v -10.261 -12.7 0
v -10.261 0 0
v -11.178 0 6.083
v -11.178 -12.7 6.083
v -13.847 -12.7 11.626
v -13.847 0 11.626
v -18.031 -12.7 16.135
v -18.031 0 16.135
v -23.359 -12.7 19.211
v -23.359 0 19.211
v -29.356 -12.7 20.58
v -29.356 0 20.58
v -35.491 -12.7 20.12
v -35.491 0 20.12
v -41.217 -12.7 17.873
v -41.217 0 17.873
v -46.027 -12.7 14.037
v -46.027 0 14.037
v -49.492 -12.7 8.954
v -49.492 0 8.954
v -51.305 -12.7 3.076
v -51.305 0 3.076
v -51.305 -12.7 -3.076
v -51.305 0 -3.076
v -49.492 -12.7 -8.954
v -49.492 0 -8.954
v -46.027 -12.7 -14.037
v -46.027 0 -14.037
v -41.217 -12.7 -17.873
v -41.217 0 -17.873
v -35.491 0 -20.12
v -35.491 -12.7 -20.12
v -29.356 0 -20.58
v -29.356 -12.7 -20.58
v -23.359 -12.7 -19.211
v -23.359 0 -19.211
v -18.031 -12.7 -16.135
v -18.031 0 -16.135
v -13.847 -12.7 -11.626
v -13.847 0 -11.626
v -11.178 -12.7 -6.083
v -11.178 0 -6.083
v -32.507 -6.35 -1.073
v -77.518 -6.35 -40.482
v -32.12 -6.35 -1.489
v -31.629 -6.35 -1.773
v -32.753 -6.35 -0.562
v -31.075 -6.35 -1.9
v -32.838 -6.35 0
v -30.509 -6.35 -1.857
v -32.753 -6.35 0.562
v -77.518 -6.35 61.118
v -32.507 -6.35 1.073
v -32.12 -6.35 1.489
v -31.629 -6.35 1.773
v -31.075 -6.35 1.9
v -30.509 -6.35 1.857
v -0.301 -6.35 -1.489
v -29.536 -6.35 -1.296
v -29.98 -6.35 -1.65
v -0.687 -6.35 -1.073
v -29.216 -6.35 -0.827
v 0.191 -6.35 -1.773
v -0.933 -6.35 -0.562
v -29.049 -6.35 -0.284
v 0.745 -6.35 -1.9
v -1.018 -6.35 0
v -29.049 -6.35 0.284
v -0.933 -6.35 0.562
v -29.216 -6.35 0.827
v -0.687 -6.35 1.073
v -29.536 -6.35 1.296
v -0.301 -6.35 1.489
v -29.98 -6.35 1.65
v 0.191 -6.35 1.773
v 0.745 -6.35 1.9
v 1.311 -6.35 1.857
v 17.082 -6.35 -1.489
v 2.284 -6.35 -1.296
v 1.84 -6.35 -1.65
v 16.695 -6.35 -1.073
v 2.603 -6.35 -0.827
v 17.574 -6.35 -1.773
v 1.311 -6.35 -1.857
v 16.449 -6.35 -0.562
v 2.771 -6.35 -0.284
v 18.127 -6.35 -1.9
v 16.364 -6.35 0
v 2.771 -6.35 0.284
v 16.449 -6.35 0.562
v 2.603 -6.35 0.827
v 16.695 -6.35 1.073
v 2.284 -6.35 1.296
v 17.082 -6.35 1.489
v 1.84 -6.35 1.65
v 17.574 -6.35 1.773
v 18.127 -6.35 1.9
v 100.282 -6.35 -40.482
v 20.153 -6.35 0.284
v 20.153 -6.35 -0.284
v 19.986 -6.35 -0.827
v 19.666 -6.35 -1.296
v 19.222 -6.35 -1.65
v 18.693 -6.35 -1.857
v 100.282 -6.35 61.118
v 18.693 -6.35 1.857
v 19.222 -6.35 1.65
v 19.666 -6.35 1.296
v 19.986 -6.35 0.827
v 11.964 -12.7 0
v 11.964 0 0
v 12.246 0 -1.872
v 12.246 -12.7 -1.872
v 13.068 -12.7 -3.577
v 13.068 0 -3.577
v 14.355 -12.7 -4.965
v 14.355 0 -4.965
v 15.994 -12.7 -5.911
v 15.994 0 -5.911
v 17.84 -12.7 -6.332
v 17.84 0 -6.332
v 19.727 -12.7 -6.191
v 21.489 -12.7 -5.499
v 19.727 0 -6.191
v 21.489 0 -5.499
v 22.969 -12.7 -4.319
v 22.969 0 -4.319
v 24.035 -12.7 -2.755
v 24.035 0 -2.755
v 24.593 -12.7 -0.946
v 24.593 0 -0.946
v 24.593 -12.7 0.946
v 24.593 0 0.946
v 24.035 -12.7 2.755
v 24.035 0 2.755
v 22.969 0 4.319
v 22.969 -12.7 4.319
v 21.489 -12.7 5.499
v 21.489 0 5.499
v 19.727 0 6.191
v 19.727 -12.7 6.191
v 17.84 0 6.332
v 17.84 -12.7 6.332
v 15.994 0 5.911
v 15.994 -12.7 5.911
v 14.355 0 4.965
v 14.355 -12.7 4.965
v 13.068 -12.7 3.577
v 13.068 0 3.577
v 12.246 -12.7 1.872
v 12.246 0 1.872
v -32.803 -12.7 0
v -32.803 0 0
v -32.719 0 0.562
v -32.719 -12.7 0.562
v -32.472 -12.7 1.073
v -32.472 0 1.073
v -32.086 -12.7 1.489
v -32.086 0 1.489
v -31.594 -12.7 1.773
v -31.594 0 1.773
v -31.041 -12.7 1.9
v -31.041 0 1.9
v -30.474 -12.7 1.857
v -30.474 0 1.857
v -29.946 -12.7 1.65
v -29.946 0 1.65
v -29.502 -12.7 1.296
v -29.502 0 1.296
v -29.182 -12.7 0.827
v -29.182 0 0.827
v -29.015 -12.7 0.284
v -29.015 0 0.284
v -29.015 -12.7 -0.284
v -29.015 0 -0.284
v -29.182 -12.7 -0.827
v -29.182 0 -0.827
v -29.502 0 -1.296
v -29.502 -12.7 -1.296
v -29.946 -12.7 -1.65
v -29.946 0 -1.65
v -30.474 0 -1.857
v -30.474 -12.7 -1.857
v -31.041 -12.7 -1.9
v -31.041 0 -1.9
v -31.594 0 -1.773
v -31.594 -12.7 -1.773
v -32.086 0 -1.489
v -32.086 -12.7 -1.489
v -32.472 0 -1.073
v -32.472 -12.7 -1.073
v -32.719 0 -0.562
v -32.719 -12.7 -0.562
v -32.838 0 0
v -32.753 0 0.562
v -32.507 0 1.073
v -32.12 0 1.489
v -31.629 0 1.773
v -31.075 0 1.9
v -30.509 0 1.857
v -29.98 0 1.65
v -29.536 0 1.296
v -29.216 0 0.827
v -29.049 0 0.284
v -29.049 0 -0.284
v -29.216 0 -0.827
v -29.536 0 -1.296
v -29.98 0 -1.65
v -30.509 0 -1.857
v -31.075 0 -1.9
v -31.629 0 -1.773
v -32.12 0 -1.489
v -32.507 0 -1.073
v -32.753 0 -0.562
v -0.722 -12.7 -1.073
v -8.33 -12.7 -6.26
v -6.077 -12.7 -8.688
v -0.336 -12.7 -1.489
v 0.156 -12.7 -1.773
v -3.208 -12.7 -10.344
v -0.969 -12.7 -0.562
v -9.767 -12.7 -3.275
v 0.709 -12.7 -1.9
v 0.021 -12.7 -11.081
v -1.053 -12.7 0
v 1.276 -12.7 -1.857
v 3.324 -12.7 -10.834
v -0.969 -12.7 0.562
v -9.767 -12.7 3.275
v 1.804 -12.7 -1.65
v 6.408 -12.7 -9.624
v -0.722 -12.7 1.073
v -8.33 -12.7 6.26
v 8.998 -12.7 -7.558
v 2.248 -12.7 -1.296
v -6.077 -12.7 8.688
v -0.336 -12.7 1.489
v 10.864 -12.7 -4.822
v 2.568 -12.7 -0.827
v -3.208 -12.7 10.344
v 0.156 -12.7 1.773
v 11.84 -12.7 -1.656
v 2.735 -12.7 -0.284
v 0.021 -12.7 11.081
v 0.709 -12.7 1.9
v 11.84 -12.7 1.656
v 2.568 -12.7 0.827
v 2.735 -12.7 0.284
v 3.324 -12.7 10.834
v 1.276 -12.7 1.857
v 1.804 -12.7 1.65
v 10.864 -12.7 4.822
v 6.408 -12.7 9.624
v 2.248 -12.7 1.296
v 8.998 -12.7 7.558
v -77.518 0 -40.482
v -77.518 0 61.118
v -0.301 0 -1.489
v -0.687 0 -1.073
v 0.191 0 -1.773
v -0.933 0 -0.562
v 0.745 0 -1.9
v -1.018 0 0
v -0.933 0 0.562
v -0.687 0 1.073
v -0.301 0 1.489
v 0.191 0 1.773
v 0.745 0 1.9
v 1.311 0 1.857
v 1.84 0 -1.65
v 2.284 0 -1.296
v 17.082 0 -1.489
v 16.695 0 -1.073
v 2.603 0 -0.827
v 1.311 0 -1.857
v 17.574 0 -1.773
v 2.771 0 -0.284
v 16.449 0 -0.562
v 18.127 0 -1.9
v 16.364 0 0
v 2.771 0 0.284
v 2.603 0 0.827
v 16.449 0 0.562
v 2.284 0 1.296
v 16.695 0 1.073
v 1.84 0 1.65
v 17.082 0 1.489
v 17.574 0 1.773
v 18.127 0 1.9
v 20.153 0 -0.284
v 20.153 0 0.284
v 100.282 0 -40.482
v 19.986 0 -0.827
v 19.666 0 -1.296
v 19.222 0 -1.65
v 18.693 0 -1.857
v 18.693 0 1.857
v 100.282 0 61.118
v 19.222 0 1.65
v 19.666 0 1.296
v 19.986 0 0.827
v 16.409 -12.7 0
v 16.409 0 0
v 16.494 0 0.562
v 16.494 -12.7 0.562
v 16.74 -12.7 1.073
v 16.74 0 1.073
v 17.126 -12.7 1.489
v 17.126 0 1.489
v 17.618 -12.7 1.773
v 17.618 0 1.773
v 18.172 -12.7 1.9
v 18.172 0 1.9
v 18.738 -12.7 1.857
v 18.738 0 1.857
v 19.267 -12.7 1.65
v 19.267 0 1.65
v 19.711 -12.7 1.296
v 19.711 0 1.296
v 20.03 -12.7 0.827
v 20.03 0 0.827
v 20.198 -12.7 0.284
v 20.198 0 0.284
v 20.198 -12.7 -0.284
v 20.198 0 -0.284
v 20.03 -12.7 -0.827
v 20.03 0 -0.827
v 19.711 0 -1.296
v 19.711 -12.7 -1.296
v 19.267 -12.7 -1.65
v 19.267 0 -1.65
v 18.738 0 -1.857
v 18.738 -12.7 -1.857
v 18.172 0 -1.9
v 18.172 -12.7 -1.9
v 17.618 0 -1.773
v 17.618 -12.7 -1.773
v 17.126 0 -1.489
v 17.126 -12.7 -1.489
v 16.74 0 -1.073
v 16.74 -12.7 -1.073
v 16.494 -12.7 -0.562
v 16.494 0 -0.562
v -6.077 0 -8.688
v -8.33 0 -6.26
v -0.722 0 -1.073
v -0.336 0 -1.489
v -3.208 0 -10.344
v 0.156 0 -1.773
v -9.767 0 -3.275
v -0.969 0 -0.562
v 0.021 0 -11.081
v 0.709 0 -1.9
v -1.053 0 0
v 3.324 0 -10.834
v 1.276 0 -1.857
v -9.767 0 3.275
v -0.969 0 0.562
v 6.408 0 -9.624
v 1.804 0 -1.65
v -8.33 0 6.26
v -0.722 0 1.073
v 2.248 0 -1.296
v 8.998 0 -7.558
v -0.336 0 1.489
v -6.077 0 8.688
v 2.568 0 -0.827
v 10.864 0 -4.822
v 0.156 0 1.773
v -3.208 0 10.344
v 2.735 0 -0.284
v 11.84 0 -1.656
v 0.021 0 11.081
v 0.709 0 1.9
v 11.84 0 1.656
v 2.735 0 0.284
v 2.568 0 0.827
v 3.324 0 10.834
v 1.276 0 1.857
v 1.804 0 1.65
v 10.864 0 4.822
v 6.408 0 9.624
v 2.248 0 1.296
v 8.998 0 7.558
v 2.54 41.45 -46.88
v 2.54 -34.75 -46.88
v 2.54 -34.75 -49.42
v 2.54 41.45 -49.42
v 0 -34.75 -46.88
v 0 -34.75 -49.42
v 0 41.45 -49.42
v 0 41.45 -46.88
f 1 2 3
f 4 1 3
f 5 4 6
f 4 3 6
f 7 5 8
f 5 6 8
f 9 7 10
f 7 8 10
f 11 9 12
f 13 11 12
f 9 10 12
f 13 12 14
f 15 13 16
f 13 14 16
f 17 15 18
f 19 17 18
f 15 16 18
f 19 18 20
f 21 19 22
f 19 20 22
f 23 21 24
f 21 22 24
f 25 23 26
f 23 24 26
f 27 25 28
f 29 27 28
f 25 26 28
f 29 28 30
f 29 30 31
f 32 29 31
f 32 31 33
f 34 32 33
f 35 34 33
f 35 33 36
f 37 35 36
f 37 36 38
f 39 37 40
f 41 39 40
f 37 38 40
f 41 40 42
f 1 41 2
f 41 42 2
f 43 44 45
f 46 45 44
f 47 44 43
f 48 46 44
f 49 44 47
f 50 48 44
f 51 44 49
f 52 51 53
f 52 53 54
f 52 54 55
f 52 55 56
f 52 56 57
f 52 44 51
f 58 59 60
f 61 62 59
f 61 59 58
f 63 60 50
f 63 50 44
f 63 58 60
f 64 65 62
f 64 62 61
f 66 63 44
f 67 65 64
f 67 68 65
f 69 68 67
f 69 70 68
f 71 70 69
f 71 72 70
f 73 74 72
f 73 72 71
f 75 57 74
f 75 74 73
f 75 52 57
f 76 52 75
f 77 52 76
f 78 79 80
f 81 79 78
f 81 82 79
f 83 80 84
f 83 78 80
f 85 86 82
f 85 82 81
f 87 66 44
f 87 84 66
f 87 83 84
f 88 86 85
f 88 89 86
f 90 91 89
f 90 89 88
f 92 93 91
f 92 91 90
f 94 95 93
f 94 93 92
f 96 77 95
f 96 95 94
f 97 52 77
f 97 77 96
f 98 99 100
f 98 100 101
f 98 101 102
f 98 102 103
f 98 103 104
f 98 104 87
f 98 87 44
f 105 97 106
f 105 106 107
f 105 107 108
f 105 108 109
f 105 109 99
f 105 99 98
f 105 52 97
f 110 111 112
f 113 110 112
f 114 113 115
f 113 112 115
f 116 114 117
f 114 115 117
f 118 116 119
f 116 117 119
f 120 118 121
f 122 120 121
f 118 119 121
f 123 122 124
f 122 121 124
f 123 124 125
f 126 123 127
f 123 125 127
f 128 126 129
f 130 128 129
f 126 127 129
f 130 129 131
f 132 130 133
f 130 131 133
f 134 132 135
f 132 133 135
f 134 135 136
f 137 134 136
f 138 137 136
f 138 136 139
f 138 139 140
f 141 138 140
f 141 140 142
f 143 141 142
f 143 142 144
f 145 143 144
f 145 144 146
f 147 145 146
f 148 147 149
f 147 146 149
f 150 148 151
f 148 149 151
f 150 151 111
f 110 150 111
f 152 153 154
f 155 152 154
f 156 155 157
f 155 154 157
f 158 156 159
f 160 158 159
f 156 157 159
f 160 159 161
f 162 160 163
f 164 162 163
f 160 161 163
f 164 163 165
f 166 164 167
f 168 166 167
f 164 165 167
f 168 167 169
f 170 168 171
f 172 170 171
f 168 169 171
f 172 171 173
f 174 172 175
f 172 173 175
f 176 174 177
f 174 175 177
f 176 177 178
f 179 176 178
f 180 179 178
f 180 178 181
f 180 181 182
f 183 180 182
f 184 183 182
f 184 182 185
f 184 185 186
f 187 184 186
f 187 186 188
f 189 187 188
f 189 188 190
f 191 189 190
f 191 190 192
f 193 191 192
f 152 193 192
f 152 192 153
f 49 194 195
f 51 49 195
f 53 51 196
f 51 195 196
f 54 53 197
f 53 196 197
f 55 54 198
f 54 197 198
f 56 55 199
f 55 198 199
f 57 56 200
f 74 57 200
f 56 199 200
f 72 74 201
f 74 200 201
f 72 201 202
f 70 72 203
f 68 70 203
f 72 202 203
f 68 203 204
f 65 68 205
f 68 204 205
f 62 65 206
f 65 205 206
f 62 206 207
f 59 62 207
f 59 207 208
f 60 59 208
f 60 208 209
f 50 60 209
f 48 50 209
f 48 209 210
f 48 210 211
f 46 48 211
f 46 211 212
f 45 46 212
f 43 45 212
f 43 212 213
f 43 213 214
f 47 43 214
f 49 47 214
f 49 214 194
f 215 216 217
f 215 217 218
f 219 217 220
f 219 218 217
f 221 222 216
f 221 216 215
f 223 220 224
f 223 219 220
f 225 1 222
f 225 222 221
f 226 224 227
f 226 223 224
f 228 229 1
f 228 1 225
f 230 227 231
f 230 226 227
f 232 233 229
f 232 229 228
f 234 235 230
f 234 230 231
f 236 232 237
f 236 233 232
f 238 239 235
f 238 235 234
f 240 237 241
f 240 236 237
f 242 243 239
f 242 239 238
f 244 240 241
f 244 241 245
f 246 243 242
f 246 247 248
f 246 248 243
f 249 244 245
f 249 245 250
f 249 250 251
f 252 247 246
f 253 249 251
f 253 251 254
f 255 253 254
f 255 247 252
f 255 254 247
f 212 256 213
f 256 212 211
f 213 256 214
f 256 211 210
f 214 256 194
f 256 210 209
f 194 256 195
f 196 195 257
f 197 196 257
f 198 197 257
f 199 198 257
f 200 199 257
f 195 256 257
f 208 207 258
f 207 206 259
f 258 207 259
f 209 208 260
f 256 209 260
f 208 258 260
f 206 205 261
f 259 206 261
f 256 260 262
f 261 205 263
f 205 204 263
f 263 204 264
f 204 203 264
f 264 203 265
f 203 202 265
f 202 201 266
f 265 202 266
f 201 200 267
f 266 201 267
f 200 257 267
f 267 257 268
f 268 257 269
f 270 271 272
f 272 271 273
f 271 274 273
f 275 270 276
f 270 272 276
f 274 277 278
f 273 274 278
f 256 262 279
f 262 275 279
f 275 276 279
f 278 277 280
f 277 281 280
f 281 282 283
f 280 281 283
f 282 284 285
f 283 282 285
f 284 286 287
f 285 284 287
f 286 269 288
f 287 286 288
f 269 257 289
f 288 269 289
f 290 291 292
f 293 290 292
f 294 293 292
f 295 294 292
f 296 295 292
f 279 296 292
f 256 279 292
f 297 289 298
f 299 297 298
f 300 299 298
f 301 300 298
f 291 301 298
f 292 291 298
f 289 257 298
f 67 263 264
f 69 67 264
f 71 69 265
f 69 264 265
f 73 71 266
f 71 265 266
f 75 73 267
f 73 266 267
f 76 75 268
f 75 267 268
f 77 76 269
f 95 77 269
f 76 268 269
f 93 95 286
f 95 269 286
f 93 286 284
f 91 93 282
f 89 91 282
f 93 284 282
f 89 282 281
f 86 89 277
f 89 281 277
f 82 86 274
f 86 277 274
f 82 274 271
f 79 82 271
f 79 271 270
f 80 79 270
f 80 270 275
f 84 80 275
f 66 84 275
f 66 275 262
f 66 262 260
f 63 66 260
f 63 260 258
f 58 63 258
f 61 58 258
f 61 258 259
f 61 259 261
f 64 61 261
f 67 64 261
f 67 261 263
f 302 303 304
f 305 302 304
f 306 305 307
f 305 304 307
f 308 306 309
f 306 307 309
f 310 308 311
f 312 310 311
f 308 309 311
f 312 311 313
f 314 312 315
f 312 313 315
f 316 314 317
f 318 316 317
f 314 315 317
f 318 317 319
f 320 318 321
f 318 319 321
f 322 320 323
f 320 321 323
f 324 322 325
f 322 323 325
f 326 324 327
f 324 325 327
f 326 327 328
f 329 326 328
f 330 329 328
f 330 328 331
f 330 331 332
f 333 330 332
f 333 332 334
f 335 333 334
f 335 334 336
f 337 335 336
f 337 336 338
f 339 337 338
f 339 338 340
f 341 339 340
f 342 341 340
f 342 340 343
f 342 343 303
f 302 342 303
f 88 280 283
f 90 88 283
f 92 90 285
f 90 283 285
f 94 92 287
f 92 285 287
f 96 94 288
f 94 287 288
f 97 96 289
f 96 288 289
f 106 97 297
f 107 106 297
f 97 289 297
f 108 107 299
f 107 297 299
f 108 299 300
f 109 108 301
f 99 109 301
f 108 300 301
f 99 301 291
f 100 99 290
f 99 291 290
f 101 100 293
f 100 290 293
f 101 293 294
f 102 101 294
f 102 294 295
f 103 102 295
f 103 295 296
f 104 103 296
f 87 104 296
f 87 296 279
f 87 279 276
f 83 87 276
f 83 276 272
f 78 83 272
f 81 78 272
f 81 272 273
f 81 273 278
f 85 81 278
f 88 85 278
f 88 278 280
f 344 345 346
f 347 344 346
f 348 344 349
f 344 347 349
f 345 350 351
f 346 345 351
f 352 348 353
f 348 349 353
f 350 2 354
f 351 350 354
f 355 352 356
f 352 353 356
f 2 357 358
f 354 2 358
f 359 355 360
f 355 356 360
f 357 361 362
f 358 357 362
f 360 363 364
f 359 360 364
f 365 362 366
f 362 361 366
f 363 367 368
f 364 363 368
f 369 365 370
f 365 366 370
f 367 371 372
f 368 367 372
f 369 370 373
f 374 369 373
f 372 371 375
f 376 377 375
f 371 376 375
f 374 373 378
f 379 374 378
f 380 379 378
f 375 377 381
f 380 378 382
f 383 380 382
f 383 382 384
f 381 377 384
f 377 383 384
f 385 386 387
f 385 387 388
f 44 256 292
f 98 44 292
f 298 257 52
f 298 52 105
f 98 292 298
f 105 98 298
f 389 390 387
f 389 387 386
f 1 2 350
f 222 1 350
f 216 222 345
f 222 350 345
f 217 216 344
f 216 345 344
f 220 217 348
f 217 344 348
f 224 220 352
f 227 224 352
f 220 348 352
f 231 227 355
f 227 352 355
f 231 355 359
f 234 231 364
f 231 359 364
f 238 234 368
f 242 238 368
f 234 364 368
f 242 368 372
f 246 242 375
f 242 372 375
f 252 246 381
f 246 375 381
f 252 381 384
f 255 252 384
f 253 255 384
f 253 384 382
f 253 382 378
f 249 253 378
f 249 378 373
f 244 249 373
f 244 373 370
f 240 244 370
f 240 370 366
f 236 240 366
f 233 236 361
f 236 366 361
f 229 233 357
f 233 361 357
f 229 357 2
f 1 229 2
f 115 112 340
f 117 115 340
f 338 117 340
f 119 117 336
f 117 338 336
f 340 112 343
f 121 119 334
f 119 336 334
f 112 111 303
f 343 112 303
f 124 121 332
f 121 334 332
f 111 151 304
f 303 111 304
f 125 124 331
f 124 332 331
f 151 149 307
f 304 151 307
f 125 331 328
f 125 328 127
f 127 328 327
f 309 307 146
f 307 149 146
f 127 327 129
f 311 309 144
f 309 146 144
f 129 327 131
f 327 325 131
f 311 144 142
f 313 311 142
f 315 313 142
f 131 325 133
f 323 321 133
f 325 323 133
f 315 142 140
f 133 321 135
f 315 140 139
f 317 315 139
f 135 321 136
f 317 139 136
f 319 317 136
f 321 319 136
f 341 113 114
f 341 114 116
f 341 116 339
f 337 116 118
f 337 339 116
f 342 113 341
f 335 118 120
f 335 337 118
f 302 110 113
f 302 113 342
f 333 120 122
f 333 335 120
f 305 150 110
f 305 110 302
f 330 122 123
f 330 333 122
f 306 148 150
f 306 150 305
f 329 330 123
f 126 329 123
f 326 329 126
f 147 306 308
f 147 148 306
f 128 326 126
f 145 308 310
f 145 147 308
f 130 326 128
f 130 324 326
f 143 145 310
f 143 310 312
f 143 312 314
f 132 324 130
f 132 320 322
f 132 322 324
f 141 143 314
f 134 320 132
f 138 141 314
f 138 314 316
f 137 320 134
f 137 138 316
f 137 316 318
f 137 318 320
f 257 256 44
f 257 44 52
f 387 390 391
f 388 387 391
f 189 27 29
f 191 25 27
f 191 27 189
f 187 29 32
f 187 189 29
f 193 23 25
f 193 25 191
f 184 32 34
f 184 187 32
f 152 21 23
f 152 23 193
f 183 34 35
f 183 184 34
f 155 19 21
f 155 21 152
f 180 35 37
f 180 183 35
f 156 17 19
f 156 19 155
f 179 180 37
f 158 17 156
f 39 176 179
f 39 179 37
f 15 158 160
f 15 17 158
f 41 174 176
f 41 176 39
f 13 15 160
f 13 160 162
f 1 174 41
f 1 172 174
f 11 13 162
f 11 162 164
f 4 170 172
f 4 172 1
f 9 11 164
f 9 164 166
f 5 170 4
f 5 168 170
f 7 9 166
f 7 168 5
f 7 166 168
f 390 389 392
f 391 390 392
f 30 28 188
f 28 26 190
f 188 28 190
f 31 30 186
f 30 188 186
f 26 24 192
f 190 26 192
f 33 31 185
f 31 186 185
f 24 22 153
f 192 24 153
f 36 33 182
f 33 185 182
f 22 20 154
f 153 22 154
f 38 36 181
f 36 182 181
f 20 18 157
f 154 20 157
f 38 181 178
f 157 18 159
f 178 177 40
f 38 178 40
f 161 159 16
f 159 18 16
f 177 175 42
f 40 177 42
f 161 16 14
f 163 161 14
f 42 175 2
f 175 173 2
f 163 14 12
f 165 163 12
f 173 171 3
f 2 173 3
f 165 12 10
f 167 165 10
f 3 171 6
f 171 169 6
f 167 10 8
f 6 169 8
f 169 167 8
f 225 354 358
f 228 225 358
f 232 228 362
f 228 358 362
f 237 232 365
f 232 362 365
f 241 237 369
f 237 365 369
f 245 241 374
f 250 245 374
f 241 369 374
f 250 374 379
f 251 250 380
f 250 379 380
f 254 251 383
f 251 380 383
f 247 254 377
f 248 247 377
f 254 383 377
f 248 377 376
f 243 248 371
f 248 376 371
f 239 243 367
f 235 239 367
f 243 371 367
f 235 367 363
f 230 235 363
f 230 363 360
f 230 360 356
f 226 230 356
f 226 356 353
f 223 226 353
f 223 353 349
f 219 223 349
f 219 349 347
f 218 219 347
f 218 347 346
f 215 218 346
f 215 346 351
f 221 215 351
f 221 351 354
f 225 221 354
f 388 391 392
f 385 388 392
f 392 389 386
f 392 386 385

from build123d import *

# Parameters (mm, degrees)
F0_W      = 177.8
F0_H      = 101.6
F2_DEPTH  = 6.35
F1_R      = 20.6375
F3_DEPTH  = 12.7
F7_D      = 3.81
F8_D      = 3.81
F9_D      = 3.81
F11_D     = 3.81
F13_D     = 3.81
F15_D     = 3.81
F16_W     = 76.2
F16_H     = 2.54
F17_DEPTH = 2.54


with BuildPart() as f2:
    # F0 (on Front) → F2 (new body)
    with BuildSketch(Plane.XZ):
        with Locations((11.3818608224, 10.3180078729)):
            Rectangle(F0_W, F0_H)
    extrude(amount=F2_DEPTH)

    # F11 (through all)
    with Locations(Plane.XZ.offset(6.35)):
        with Locations((-30.9327120275, 0)):
            Hole(F11_D / 2)

    # F13 (through all)
    with Locations(Plane.XZ.offset(6.35)):
        with Locations((0.8871365836, 0)):
            Hole(F13_D / 2)

    # F15 (through all)
    with Locations(Plane.XZ.offset(6.35)):
        with Locations((18.2694828434, 0)):
            Hole(F15_D / 2)


with BuildPart() as f3:
    # F1 (on face) → F3 (new body)
    with BuildSketch(Plane.XZ):
        with Locations((-30.8983638078, 0)):
            Circle(F1_R)
    extrude(amount=F3_DEPTH)

    # F7 (through all)
    with Locations(Plane.XZ.offset(12.7)):
        with Locations((-30.8983638078, 0)):
            Hole(F7_D / 2)


with BuildPart() as f3b:
    # F1 (on face) → F3, piece 2 (new body)
    with BuildSketch(Plane.XZ):
        with BuildLine():
            ThreePointArc((24.6641361922, 0), (18.3141361922, 6.35), (11.9641361922, 0))
            ThreePointArc((11.9641361922, 0), (18.3141361922, -6.35), (24.6641361922, 0))
        make_face()
    extrude(amount=F3_DEPTH)

    # F9 (through all)
    with Locations(Plane.XZ.offset(12.7)):
        with Locations((18.3141361922, 0)):
            Hole(F9_D / 2)


with BuildPart() as f3c:
    # F1 (on face) → F3, piece 3 (new body)
    with BuildSketch(Plane.XZ):
        with BuildLine():
            ThreePointArc((11.9641361922, 0), (0.8516361922, 11.1125), (-10.2608638078, 0))
            ThreePointArc((-10.2608638078, 0), (0.8516361922, -11.1125), (11.9641361922, 0))
        make_face()
    extrude(amount=F3_DEPTH)

    # F8 (through all)
    with Locations(Plane.XZ.offset(12.7)):
        with Locations((0.8516361922, 0)):
            Hole(F8_D / 2)


with BuildPart() as f17:
    # F16 (on Right) → F17 (new body)
    with BuildSketch(Plane.YZ):
        with Locations((3.3502218379, -48.1499638951)):
            Rectangle(F16_W, F16_H)
    extrude(amount=F17_DEPTH)


solid = Compound([f2.part, f3.part, f3b.part, f3c.part, f17.part])
